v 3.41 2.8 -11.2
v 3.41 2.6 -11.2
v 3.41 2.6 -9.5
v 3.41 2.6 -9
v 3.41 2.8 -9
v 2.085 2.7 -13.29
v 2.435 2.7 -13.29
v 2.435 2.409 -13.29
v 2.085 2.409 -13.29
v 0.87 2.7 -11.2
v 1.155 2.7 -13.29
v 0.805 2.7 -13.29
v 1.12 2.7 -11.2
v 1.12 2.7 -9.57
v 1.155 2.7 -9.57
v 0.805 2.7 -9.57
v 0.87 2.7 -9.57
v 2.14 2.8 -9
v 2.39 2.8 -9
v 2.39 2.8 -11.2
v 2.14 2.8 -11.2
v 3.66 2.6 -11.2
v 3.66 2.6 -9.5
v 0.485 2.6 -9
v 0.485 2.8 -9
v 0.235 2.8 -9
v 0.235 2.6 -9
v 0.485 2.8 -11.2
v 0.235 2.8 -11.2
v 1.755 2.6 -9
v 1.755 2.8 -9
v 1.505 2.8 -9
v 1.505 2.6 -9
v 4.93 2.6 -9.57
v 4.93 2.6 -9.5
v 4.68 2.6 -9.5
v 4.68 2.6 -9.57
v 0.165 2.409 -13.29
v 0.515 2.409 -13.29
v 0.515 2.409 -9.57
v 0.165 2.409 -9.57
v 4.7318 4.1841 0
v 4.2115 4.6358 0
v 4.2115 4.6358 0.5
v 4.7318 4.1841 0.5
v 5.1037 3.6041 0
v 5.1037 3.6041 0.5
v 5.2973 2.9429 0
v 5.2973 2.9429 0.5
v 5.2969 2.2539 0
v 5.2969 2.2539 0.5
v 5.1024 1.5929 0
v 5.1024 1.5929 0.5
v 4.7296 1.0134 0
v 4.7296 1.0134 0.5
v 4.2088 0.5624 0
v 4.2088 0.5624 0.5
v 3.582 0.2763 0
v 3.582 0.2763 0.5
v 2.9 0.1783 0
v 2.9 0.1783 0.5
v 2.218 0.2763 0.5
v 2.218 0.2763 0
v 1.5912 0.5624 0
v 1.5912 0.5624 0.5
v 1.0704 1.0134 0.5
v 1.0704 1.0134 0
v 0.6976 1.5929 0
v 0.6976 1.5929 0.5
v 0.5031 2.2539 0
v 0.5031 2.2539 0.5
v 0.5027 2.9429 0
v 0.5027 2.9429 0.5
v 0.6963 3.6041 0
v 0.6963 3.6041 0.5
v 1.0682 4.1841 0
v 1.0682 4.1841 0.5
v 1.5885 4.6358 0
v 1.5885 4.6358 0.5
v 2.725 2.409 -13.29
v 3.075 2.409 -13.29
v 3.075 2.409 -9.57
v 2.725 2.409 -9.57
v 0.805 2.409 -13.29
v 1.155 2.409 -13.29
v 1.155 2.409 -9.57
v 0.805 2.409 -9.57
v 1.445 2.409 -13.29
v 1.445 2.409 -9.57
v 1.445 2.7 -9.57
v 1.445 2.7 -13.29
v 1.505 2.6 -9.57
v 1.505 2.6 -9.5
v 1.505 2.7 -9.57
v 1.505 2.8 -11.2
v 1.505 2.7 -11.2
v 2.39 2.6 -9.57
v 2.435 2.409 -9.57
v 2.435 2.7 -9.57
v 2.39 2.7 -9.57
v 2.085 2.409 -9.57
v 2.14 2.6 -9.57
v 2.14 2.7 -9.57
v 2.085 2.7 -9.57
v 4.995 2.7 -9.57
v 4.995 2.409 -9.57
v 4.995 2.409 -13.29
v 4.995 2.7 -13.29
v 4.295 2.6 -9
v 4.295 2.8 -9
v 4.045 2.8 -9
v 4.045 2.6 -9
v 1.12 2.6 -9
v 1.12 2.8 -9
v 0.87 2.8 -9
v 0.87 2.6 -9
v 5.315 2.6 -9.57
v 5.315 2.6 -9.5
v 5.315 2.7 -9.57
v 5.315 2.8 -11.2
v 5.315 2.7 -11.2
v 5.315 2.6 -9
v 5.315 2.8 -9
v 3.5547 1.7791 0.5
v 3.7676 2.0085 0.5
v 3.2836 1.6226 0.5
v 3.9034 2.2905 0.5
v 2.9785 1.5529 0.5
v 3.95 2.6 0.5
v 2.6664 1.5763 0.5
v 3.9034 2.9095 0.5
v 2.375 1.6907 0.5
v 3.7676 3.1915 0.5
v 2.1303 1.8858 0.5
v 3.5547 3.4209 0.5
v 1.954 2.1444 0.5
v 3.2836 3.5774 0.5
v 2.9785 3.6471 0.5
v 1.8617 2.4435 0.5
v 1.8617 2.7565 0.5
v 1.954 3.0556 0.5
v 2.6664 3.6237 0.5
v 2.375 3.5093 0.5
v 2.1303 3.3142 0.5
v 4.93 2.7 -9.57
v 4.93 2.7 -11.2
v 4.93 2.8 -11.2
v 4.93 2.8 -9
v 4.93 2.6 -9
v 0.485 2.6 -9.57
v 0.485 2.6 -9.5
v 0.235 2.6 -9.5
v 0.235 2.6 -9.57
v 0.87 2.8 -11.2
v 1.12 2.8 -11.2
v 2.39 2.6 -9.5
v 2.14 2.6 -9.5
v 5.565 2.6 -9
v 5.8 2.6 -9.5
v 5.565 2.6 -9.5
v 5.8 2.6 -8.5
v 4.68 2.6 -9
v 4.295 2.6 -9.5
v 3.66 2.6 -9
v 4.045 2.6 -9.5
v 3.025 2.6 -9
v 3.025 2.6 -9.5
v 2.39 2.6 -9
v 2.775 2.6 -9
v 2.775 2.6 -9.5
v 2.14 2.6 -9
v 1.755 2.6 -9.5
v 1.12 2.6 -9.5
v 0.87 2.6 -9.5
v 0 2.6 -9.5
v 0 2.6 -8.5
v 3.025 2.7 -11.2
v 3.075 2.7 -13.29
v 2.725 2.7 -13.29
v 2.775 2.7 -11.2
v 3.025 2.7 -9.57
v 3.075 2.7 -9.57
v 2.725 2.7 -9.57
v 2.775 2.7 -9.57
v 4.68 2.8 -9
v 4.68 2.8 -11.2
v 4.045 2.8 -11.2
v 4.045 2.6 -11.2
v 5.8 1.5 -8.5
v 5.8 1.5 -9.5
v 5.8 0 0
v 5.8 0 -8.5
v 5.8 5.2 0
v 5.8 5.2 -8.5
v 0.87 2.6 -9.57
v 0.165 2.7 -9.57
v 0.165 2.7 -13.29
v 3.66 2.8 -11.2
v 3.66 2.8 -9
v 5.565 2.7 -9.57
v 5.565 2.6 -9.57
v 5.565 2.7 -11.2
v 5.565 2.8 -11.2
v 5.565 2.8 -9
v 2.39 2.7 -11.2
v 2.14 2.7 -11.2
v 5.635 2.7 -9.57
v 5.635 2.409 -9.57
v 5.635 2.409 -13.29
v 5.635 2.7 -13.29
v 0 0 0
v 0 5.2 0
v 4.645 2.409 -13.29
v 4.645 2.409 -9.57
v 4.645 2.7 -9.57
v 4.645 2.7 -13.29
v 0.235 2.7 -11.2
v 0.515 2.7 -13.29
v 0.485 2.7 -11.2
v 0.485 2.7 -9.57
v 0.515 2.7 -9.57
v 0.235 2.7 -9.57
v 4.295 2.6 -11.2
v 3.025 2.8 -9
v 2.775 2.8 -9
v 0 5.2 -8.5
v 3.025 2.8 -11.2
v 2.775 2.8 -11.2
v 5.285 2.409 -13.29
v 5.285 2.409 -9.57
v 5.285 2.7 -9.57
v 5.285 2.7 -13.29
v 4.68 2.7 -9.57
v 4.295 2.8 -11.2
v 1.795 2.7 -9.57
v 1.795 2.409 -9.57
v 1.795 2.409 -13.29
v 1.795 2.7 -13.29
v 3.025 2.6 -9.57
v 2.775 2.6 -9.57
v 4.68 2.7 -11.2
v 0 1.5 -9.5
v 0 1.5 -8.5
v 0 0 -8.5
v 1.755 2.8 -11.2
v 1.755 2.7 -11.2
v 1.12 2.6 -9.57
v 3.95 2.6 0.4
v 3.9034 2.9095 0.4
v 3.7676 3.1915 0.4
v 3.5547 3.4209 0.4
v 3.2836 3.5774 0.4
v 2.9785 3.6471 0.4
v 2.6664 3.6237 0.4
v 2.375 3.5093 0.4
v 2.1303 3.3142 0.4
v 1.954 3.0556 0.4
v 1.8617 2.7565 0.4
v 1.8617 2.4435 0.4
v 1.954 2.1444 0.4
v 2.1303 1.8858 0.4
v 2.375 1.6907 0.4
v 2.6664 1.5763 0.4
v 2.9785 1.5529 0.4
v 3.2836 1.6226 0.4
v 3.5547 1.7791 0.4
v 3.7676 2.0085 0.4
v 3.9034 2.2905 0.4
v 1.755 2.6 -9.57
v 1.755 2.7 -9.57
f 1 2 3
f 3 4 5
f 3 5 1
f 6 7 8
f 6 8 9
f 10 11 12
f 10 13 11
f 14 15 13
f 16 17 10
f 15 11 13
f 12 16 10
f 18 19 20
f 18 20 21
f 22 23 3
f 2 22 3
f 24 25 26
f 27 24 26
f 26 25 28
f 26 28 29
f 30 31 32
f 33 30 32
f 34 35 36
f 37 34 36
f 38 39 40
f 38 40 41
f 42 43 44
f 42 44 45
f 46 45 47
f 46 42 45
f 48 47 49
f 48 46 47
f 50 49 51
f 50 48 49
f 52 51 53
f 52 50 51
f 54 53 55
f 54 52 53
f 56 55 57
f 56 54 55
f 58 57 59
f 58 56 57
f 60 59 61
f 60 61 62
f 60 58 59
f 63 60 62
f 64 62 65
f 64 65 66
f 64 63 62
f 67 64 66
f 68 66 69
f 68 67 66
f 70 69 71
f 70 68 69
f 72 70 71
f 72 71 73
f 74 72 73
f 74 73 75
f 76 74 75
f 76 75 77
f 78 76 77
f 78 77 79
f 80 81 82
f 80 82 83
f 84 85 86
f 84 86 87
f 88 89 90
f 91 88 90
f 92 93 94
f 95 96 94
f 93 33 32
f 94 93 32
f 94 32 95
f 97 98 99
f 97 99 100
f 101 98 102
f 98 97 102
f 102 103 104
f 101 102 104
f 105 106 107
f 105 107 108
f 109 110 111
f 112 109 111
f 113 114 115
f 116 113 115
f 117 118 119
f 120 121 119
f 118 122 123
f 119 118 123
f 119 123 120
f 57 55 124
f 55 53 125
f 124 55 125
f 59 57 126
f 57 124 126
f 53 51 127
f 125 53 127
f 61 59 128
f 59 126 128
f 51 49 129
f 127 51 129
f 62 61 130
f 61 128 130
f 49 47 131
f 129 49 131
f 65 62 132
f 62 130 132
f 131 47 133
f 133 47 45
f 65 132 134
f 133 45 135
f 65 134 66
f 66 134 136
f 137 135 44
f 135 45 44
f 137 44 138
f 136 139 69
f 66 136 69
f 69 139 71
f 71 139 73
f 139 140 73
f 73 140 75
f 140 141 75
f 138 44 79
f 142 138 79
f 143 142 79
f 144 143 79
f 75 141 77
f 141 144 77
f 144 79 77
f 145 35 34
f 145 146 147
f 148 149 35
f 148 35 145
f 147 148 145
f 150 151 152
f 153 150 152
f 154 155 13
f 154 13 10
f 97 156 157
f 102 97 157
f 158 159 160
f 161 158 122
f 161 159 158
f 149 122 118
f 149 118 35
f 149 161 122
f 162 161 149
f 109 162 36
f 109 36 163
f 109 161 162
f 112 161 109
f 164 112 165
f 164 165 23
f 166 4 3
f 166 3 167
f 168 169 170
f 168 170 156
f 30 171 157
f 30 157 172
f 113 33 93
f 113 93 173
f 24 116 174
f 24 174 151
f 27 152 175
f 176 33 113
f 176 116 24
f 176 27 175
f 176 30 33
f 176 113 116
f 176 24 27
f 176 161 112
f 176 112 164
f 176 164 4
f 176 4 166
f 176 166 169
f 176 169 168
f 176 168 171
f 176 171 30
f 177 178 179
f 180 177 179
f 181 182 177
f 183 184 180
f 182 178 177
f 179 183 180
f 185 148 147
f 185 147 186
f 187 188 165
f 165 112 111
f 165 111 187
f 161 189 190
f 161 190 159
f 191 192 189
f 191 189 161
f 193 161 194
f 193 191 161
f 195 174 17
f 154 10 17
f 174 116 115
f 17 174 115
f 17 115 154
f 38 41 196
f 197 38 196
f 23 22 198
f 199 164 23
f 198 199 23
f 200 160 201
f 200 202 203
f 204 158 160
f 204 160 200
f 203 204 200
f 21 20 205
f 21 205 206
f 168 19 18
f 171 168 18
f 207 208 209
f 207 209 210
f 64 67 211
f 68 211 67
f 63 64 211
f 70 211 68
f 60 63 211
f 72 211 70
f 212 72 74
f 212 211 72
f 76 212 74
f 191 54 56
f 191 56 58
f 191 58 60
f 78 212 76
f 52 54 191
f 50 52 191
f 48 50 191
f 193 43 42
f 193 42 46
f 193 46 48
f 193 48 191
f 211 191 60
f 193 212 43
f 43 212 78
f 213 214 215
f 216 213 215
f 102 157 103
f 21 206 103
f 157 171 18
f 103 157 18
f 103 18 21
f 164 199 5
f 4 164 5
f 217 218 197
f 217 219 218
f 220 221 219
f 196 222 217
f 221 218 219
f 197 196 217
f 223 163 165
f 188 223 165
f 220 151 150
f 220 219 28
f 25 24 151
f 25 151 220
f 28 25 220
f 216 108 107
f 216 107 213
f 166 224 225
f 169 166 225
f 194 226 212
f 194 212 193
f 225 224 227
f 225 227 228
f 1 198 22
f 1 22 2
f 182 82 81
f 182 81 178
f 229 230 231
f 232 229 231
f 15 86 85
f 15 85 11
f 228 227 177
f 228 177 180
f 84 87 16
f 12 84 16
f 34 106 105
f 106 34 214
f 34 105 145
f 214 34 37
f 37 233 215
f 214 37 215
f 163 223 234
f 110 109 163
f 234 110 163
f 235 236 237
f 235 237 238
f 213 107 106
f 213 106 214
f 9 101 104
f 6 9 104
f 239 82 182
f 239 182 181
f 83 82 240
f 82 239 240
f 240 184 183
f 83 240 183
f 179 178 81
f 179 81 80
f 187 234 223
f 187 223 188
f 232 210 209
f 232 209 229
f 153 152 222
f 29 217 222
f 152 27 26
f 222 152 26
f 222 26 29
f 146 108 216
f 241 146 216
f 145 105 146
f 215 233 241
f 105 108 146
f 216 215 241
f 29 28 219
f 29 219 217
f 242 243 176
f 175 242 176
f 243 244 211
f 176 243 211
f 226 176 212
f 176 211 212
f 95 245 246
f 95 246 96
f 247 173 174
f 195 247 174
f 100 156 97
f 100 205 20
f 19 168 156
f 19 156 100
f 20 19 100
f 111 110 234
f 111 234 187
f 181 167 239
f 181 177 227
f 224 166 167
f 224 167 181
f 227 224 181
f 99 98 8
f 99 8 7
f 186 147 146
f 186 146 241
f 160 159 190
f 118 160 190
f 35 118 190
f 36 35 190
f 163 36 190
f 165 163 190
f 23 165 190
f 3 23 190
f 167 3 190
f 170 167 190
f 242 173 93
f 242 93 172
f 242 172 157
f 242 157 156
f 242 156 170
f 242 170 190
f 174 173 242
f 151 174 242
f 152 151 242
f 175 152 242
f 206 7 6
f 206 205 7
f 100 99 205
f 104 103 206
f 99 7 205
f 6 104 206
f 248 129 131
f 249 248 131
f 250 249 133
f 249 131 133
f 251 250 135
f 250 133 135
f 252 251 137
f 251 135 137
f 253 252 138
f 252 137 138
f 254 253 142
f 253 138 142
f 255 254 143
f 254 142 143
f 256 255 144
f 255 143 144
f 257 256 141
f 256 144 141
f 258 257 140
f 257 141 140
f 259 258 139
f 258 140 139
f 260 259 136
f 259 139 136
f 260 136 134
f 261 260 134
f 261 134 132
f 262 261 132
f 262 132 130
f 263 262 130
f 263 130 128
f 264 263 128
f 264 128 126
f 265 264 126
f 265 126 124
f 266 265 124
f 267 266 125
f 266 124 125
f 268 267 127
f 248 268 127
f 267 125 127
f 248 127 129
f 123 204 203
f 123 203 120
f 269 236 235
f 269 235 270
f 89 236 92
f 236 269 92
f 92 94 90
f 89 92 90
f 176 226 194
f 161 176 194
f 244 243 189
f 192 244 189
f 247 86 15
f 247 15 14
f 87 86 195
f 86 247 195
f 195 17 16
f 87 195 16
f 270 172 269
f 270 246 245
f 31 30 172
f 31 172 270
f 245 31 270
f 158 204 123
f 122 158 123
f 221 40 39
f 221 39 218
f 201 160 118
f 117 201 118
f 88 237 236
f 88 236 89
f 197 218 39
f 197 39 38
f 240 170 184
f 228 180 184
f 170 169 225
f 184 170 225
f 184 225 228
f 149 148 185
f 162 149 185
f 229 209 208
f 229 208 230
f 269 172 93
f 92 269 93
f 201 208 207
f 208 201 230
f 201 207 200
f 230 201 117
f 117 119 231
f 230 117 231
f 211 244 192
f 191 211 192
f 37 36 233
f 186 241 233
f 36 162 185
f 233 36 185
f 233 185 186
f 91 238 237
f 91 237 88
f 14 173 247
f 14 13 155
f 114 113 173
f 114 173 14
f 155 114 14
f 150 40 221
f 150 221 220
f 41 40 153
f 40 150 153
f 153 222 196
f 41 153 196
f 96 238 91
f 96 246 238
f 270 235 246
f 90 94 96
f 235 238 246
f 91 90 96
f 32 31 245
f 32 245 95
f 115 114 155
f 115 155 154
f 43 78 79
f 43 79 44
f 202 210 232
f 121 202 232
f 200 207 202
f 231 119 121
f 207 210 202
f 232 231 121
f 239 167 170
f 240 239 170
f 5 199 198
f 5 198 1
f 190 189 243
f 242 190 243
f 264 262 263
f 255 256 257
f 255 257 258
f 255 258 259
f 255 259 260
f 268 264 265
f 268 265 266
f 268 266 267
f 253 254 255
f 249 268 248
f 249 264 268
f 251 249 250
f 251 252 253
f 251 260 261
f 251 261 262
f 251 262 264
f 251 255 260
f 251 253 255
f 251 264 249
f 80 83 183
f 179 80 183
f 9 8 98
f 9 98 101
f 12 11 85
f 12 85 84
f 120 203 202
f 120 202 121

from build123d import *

# Parameters (mm, degrees)
SKETCH1_W            = 5.8
SKETCH1_H            = 5.2
BOSS_EXTRUDE1_DEPTH  = 8.5
BOSS_EXTRUDE2_DEPTH  = 0.5
SKETCH4_W            = 5.8
SKETCH4_H            = 1.1
BOSS_EXTRUDE3_DEPTH  = 1
BOSS_EXTRUDE6_START  = 0.5
SKETCH10_W           = 0.25
SKETCH10_H           = 0.2
BOSS_EXTRUDE6_DEPTH  = 2.2
BOSS_EXTRUDE7_START  = 0.07
SKETCH11_W           = 0.35
SKETCH11_H           = 0.291
BOSS_EXTRUDE7_DEPTH  = 3.72
LPATTERN3_COUNT      = 5
LPATTERN3_PITCH      = 0.635
LPATTERN3_COL_COUNT  = 5
LPATTERN3_COL_PITCH  = 0.635
LPATTERN4_COUNT      = 5
LPATTERN4_PITCH      = 0.64
LPATTERN4_COUNT_DIR2 = 5
LPATTERN4_PITCH_DIR2 = 0.64
SKETCH13_R           = 1.05
CUT_EXTRUDE1_DEPTH   = 0.1


with BuildPart() as part:
    # Sketch1 → Boss-Extrude1 (new body)
    with BuildSketch(Plane.XY):
        with Locations((2.9, 2.6)):
            Rectangle(SKETCH1_W, SKETCH1_H)
    extrude(amount=-BOSS_EXTRUDE1_DEPTH)

    # Sketch3 → Boss-Extrude2 (add)
    with BuildSketch(Plane.XY):
        with BuildLine():
            Line((1.588464453, 4.635827248), (4.211535547, 4.635827248))
            ThreePointArc((4.211535547, 4.635827248), (2.9, 0.178281999), (1.588464453, 4.635827248))
        make_face()
    extrude(amount=BOSS_EXTRUDE2_DEPTH)

    # Sketch4 → Boss-Extrude3 (add)
    with BuildSketch(Plane(origin=(0, 0, -8.5), x_dir=(-1, 0, 0), z_dir=(0, 0, -1))):
        with Locations((-2.9, 2.05)):
            Rectangle(SKETCH4_W, SKETCH4_H)
    extrude(amount=BOSS_EXTRUDE3_DEPTH)

    # Sketch10 → Boss-Extrude6 (add)
    with BuildSketch(Plane(origin=(0, 0, -8.5), x_dir=(-1, 0, 0), z_dir=(0, 0, -1)).offset(BOSS_EXTRUDE6_START)):
        with Locations((-2.9, 2.7)):
            Rectangle(SKETCH10_W, SKETCH10_H)
    boss_extrude6 = extrude(amount=BOSS_EXTRUDE6_DEPTH)

    # Sketch11 → Boss-Extrude7 (add)
    with BuildSketch(Plane(origin=(0, 0, -9.5), x_dir=(-1, 0, 0), z_dir=(0, 0, -1)).offset(BOSS_EXTRUDE7_START)):
        with Locations((-2.9, 2.5545)):
            Rectangle(SKETCH11_W, SKETCH11_H)
    boss_extrude7 = extrude(amount=BOSS_EXTRUDE7_DEPTH)

    # LPattern3: Boss-Extrude6 ×5
    with Locations(*[(-i * LPATTERN3_PITCH, 0, 0) for i in range(1, LPATTERN3_COUNT)]):
        add(boss_extrude6)

    # LPattern3 col: Boss-Extrude6 ×5
    with Locations(*[(i * LPATTERN3_COL_PITCH, 0, 0) for i in range(1, LPATTERN3_COL_COUNT)]):
        add(boss_extrude6)

    # LPattern4: Boss-Extrude7 5 × 5, 7 skipped
    with Locations(*[Vector(-1, 0, 0) * (i * LPATTERN4_PITCH) + Vector(1, 0, 0) * (j * LPATTERN4_PITCH_DIR2) for i in range(LPATTERN4_COUNT) for j in range(LPATTERN4_COUNT_DIR2) if (i, j) not in ((0, 0), (0, 1), (0, 2), (1, 2), (1, 3), (2, 3), (2, 4), (3, 4))]):
        add(boss_extrude7)

    # Sketch13 → Cut-Extrude1 (cut)
    with BuildSketch(Plane.XY.offset(0.5)):
        with Locations((2.9, 2.6)):
            Circle(SKETCH13_R)
    extrude(amount=-CUT_EXTRUDE1_DEPTH, mode=Mode.SUBTRACT)


solid = part.part
